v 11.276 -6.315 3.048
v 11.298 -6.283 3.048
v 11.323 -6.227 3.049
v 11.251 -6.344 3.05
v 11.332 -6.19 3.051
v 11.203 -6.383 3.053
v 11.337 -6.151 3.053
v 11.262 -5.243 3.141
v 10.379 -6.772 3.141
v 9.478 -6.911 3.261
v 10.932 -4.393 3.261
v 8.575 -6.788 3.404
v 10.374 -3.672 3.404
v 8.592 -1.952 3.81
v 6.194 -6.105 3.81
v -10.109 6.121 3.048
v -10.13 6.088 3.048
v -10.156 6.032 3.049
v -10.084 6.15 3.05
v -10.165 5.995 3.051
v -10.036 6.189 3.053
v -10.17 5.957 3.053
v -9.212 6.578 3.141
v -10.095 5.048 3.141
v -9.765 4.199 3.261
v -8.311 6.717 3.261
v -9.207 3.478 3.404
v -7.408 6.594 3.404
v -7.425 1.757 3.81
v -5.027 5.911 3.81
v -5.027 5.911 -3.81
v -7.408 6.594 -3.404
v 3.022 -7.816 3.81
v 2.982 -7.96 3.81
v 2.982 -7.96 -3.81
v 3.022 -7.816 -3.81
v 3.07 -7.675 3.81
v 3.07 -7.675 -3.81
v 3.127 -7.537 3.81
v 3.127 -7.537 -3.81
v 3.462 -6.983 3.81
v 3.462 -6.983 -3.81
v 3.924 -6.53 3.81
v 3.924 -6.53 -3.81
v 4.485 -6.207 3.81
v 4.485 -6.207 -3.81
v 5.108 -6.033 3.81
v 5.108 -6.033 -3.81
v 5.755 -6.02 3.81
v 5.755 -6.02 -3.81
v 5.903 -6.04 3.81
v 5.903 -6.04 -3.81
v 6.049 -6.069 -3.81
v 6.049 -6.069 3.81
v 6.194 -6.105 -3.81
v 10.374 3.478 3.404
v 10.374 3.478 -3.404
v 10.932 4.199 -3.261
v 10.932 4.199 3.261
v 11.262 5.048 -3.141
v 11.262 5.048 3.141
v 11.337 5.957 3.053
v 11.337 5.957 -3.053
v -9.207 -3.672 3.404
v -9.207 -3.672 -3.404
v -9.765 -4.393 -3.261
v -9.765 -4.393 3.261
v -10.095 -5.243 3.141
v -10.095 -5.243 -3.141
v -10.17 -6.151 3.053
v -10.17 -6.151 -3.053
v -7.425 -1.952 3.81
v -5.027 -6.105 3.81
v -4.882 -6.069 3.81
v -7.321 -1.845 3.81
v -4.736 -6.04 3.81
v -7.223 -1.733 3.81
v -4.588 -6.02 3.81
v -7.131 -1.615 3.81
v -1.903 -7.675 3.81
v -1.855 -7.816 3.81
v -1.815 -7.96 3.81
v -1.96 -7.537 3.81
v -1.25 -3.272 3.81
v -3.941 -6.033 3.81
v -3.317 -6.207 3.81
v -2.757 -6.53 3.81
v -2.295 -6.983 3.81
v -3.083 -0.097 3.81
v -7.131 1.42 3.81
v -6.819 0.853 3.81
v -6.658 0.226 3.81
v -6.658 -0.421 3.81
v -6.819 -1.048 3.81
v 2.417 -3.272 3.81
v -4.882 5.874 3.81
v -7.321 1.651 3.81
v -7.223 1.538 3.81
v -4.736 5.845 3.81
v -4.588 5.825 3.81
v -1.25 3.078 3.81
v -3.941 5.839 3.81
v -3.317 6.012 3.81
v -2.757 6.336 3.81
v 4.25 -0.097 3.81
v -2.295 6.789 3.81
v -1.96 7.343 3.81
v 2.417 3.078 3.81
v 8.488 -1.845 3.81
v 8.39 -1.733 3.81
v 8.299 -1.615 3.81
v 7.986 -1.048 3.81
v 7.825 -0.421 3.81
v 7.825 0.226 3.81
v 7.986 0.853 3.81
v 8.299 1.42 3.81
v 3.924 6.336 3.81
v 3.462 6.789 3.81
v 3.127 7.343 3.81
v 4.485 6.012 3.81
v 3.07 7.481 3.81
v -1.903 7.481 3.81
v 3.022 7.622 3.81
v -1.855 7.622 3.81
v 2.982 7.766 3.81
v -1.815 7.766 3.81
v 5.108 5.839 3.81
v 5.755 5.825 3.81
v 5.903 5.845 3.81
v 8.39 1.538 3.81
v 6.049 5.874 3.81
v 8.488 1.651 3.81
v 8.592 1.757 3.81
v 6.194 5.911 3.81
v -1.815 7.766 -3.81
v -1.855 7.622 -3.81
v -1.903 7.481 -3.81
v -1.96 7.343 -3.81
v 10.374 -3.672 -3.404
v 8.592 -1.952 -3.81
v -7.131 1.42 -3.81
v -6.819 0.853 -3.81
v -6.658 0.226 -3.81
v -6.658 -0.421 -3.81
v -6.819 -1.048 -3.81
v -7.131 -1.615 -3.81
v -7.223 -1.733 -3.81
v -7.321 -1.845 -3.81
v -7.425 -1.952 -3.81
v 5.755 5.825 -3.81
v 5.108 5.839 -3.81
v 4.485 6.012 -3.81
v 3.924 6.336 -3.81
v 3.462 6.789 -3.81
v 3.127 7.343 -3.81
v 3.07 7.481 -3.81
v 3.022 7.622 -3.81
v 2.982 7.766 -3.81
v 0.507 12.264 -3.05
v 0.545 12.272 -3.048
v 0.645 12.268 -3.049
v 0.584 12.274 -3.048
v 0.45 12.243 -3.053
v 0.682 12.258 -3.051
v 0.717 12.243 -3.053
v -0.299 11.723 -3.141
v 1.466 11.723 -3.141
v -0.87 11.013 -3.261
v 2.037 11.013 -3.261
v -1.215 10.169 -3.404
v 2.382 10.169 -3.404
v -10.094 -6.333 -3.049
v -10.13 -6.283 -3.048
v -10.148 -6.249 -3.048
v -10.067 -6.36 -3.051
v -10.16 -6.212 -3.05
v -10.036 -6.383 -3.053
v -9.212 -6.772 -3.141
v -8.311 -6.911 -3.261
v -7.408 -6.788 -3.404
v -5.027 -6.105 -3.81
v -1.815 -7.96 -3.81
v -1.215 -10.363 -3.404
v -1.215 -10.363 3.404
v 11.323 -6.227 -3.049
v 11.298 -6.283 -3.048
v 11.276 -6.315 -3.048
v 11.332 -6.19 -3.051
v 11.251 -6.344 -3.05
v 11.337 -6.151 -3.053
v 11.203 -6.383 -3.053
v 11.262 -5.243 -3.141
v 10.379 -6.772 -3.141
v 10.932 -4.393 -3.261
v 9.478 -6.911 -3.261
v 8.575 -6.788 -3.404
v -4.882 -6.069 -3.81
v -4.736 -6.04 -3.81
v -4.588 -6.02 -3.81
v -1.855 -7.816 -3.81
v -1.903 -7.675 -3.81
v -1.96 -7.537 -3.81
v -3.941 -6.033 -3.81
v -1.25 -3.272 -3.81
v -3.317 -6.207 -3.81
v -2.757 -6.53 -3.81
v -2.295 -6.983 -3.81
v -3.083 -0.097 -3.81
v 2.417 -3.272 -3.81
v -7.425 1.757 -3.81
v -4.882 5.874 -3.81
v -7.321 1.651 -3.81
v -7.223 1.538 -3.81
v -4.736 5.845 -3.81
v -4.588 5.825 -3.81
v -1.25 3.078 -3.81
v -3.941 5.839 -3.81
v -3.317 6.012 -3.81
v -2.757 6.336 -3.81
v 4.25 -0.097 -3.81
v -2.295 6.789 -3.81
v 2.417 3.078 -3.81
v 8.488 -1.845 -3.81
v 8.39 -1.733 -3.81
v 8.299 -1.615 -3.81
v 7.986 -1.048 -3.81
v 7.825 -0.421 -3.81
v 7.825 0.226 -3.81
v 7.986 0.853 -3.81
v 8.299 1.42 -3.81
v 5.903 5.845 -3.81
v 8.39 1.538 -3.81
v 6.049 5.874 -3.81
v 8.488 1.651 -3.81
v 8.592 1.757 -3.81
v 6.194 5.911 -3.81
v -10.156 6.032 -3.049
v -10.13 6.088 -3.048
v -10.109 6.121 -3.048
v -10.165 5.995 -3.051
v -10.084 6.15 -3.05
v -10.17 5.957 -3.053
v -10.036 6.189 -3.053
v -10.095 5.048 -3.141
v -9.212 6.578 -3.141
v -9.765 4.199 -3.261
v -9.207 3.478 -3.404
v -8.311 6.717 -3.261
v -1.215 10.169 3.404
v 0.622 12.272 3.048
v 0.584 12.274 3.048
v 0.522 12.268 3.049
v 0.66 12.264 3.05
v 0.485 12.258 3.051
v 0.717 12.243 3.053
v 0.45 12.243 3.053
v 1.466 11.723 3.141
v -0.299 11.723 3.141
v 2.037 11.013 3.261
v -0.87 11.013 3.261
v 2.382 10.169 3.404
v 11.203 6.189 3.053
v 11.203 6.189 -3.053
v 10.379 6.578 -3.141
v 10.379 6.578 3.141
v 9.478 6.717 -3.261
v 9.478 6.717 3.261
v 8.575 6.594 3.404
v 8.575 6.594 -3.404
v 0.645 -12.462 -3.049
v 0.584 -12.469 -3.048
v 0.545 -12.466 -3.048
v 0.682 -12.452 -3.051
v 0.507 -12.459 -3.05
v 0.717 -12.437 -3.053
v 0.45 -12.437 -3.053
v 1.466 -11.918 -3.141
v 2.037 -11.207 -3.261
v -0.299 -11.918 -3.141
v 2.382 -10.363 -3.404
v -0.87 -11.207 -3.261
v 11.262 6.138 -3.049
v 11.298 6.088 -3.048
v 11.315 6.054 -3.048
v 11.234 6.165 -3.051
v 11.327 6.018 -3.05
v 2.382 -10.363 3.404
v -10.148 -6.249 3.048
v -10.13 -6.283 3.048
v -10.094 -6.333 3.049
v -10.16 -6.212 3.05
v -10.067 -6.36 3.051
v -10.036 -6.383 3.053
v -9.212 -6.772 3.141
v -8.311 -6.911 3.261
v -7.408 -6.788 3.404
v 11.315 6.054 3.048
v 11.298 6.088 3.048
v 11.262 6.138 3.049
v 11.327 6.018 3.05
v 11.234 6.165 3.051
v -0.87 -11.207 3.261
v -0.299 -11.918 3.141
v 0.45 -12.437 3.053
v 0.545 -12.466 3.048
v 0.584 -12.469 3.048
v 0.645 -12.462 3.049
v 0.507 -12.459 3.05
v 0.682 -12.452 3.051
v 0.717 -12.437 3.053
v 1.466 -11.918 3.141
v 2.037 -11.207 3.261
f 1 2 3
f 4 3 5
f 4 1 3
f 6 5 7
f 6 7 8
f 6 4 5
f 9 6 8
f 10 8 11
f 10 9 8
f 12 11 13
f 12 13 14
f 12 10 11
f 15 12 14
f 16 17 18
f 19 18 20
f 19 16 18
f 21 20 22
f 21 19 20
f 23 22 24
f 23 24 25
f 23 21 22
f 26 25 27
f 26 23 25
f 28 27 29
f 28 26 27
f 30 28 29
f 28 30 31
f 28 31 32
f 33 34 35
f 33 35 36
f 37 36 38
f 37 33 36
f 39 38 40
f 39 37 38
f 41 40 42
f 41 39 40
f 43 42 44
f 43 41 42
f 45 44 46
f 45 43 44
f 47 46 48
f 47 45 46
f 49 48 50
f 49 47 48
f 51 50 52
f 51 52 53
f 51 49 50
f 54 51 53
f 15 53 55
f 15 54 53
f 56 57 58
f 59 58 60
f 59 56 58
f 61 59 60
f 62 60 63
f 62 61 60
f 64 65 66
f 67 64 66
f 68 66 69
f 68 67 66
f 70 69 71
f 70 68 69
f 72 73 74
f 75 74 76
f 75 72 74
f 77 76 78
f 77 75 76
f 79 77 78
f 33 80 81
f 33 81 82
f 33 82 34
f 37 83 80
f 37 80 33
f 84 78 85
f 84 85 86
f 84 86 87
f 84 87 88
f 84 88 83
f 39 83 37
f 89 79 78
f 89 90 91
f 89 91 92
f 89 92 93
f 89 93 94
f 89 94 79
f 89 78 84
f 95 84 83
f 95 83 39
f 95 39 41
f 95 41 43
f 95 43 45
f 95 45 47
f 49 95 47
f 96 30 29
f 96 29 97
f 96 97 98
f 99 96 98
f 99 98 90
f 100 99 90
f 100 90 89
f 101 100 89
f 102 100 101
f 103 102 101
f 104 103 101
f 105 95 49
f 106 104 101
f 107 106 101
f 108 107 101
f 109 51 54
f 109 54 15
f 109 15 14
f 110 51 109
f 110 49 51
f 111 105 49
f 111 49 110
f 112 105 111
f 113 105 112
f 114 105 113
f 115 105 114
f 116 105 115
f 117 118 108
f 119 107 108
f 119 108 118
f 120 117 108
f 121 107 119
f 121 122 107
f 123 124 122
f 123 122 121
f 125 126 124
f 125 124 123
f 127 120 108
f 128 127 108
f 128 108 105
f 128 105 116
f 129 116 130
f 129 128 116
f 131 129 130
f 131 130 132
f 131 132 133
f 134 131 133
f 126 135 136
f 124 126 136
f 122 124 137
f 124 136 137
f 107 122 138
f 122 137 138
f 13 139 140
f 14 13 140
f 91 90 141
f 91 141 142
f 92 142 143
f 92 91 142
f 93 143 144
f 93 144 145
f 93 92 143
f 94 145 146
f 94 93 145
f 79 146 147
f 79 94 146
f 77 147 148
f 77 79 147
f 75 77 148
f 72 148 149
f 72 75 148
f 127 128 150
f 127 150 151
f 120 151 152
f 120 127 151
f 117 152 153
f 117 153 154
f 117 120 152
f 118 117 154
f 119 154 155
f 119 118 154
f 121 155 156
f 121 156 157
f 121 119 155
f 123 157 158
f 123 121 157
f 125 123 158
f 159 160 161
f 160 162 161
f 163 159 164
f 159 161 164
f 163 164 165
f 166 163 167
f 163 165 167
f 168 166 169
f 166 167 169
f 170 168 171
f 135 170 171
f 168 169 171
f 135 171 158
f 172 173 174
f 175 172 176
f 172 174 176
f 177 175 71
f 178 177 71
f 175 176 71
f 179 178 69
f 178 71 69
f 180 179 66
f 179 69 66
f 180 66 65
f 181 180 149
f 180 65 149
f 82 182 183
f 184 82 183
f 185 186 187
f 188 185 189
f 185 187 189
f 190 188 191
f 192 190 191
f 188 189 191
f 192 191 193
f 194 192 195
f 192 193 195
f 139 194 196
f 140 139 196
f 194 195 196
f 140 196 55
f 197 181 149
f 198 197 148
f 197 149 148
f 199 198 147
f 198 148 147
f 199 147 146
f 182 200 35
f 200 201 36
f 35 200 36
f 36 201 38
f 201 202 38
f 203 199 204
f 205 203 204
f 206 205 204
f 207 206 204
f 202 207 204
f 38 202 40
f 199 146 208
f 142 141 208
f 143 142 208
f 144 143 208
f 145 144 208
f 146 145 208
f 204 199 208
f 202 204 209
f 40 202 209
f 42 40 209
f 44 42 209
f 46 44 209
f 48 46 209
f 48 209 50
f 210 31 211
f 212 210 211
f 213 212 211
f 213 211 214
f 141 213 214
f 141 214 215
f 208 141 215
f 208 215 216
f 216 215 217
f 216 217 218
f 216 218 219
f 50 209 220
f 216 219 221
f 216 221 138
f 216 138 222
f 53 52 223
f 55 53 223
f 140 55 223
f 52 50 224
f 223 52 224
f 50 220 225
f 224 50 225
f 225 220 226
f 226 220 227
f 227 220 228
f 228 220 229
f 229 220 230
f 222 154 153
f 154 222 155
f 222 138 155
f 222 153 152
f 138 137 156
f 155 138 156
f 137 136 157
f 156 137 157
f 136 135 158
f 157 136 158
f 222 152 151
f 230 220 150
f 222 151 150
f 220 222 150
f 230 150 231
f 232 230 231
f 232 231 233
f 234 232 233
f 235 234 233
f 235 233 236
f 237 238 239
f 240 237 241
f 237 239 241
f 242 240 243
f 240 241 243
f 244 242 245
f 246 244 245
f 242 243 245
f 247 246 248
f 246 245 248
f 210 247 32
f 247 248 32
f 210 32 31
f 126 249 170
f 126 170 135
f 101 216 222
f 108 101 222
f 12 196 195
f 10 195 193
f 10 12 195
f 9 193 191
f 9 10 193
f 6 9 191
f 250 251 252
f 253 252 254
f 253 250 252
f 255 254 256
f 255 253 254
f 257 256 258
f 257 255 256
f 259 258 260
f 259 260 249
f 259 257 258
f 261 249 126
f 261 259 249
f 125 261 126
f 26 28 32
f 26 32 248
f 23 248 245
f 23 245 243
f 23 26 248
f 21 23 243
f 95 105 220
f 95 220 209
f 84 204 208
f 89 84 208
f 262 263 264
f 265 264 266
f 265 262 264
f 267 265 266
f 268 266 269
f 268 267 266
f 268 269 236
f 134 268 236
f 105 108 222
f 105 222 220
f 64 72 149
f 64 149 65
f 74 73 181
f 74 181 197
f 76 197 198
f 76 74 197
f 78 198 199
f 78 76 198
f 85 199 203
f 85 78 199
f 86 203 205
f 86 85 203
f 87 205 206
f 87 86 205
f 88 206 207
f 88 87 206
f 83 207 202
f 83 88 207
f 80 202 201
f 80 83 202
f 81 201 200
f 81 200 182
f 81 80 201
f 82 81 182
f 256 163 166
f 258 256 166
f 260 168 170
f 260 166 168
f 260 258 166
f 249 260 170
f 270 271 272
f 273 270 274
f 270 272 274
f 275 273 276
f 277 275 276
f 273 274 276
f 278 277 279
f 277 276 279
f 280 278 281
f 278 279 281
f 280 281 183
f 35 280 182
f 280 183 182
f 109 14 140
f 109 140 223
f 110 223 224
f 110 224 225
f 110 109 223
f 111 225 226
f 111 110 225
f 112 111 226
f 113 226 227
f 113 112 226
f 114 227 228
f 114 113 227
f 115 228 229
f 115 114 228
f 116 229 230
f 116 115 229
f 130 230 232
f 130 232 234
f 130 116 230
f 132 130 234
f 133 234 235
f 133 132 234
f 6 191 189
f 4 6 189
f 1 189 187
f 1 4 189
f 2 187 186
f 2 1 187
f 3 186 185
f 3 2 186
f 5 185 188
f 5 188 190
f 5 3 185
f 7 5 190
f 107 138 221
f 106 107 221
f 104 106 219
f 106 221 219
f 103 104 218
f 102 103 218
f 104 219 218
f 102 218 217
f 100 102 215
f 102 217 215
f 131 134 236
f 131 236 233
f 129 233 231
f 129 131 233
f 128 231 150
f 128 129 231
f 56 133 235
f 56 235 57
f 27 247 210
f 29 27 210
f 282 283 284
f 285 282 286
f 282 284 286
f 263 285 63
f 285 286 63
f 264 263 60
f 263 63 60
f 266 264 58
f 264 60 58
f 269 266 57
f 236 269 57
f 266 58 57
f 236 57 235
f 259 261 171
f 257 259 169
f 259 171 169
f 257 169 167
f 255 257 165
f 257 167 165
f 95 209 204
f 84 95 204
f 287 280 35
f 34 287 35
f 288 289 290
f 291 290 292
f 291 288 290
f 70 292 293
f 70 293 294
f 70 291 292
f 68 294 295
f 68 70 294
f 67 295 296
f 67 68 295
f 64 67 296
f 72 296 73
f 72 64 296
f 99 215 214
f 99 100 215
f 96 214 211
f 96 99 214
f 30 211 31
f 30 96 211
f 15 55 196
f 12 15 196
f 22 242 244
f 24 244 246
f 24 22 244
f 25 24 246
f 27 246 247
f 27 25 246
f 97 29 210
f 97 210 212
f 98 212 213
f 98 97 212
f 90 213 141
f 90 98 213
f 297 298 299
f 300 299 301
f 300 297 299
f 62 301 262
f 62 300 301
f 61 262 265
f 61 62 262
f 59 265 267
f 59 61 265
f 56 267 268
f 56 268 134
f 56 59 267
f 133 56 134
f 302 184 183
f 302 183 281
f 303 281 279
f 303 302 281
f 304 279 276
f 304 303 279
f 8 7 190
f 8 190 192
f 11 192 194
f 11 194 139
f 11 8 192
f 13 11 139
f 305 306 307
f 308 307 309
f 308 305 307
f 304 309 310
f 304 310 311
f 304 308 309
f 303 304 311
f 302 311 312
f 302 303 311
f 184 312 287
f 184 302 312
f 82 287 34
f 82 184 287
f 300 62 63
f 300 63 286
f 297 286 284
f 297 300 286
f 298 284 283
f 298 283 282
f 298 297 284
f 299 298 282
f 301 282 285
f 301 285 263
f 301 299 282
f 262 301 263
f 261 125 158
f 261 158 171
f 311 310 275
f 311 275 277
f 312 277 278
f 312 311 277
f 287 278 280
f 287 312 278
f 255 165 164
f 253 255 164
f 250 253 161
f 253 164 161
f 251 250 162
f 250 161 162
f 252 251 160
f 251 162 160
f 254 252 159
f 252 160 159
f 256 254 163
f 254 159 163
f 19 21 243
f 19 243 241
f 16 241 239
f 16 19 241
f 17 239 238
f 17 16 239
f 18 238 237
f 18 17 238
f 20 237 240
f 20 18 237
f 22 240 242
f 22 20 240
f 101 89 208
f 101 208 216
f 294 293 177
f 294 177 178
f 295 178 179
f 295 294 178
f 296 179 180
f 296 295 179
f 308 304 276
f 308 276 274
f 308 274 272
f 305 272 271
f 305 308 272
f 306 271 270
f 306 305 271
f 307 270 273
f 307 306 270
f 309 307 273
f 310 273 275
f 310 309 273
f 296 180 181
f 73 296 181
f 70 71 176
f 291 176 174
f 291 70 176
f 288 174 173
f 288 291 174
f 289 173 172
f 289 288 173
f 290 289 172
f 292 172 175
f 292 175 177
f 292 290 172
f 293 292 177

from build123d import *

# Parameters (mm, degrees)
BOSS_EXTRUDE1_DEPTH     = 3.81
CUT_EXTRUDE1_DEPTH      = 18.281637299
CIRPATTERN1_COUNT       = 6
MIRROR1_COPY_1_DEPTH    = 18.281637299
MIRROR1_COPY_2_DEPTH    = 18.281637299
MIRROR1_COPY_3_DEPTH    = 18.281637299
MIRROR1_COPY_4_DEPTH    = 18.281637299
MIRROR1_COPY_5_DEPTH    = 18.281637299
CUT_EXTRUDE2_DEPTH      = 19.498737463
CUT_EXTRUDE2_DEPTH_BACK = 19.498737463


with BuildPart() as part:
    # Sketch1 → Boss-Extrude1 (new, symmetric)
    with BuildSketch(Plane.XY):
        with BuildLine():
            Line((-5.026722801, 5.910971637), (-7.407741623, 6.593717798))
            ThreePointArc((-7.407741623, 6.593717798), (-8.766513969, 6.679662371), (-10.036356458, 6.18859332))
            ThreePointArc((-10.036356458, 6.18859332), (-10.13048223, 6.088494289), (-10.170107647, 5.956929464))
            ThreePointArc((-10.170107647, 5.956929464), (-9.960464677, 4.611679084), (-9.20664832, 3.477920001))
            Line((-9.20664832, 3.477920001), (-7.424863389, 1.757270295))
            ThreePointArc((-7.424863389, 1.757270295), (-7.270818157, 1.595014723), (-7.131420667, 1.420014312))
            ThreePointArc((-7.131420667, 1.420014312), (-6.637662134, -0.097259644), (-7.131420667, -1.6145336))
            ThreePointArc((-7.131420667, -1.6145336), (-7.270818157, -1.789534012), (-7.424863389, -1.951789584))
            Line((-7.424863389, -1.951789584), (-9.20664832, -3.67243929))
            ThreePointArc((-9.20664832, -3.67243929), (-9.960464677, -4.806198373), (-10.170107647, -6.151448752))
            ThreePointArc((-10.170107647, -6.151448752), (-10.13048223, -6.283013578), (-10.036356458, -6.383112608))
            ThreePointArc((-10.036356458, -6.383112608), (-8.766513969, -6.87418166), (-7.407741623, -6.788237086))
            Line((-7.407741623, -6.788237086), (-5.026722801, -6.105490926))
            ThreePointArc((-5.026722801, -6.105490926), (-4.809182738, -6.053211627), (-4.587929191, -6.019990065))
            ThreePointArc((-4.587929191, -6.019990065), (-3.027052134, -6.351019611), (-1.95993361, -7.537264021))
            ThreePointArc((-1.95993361, -7.537264021), (-1.878077553, -7.745485994), (-1.814582722, -7.960020865))
            Line((-1.814582722, -7.960020865), (-1.215348831, -10.363416732))
            ThreePointArc((-1.215348831, -10.363416732), (-0.610392842, -11.583120388), (0.449806676, -12.437301716))
            ThreePointArc((0.449806676, -12.437301716), (0.583557866, -12.468767511), (0.717309055, -12.437301716))
            ThreePointArc((0.717309055, -12.437301716), (1.777508573, -11.583120388), (2.382464562, -10.363416732))
            Line((2.382464562, -10.363416732), (2.981698454, -7.960020865))
            ThreePointArc((2.981698454, -7.960020865), (3.045193285, -7.745485994), (3.127049342, -7.537264021))
            ThreePointArc((3.127049342, -7.537264021), (4.194167866, -6.351019611), (5.755044922, -6.019990065))
            ThreePointArc((5.755044922, -6.019990065), (5.976298469, -6.053211627), (6.193838533, -6.105490926))
            Line((6.193838533, -6.105490926), (8.574857355, -6.788237086))
            ThreePointArc((8.574857355, -6.788237086), (9.933629701, -6.87418166), (11.203472189, -6.383112608))
            ThreePointArc((11.203472189, -6.383112608), (11.297597962, -6.283013578), (11.337223379, -6.151448752))
            ThreePointArc((11.337223379, -6.151448752), (11.127580408, -4.806198373), (10.373764051, -3.67243929))
            Line((10.373764051, -3.67243929), (8.591979121, -1.951789584))
            ThreePointArc((8.591979121, -1.951789584), (8.437933888, -1.789534012), (8.298536398, -1.6145336))
            ThreePointArc((8.298536398, -1.6145336), (7.804777866, -0.097259644), (8.298536398, 1.420014312))
            ThreePointArc((8.298536398, 1.420014312), (8.437933888, 1.595014723), (8.591979121, 1.757270295))
            Line((8.591979121, 1.757270295), (10.373764051, 3.477920001))
            ThreePointArc((10.373764051, 3.477920001), (11.127580408, 4.611679084), (11.337223379, 5.956929464))
            ThreePointArc((11.337223379, 5.956929464), (11.297597962, 6.088494289), (11.203472189, 6.18859332))
            ThreePointArc((11.203472189, 6.18859332), (9.933629701, 6.679662371), (8.574857355, 6.593717798))
            Line((8.574857355, 6.593717798), (6.193838533, 5.910971637))
            ThreePointArc((6.193838533, 5.910971637), (5.976298469, 5.858692338), (5.755044922, 5.825470777))
            ThreePointArc((5.755044922, 5.825470777), (4.194167866, 6.156500322), (3.127049342, 7.342744732))
            ThreePointArc((3.127049342, 7.342744732), (3.045193285, 7.550966706), (2.981698454, 7.765501576))
            Line((2.981698454, 7.765501576), (2.382464562, 10.168897443))
            ThreePointArc((2.382464562, 10.168897443), (1.777508573, 11.3886011), (0.717309055, 12.242782428))
            ThreePointArc((0.717309055, 12.242782428), (0.583557866, 12.274248223), (0.449806676, 12.242782428))
            ThreePointArc((0.449806676, 12.242782428), (-0.610392842, 11.3886011), (-1.215348831, 10.168897443))
            Line((-1.215348831, 10.168897443), (-1.814582722, 7.765501576))
            ThreePointArc((-1.814582722, 7.765501576), (-1.878077553, 7.550966706), (-1.95993361, 7.342744732))
            ThreePointArc((-1.95993361, 7.342744732), (-3.027052134, 6.156500322), (-4.587929191, 5.825470777))
            ThreePointArc((-4.587929191, 5.825470777), (-4.809182738, 5.858692338), (-5.026722801, 5.910971637))
        make_face()
    extrude(amount=BOSS_EXTRUDE1_DEPTH, both=True)

    # Sketch2 → Cut-Extrude1 (cut, symmetric)
    with BuildSketch(Plane(origin=(0, 0, 0), x_dir=(0, 0, -1), z_dir=(1, 0, 0))):
        Polygon((-3.048, 12.274248223), (-3.81, 7.765501576), (-3.81, 12.274248223), align=None)
    cut_extrude1 = extrude(amount=CUT_EXTRUDE1_DEPTH, both=True, mode=Mode.SUBTRACT)

    # CirPattern1: Cut-Extrude1 ×6 about axis
    cirpattern1_axis = Axis((0.583557866, -0.097259644, -4.191), (0, 0, 1))
    for i in range(1, CIRPATTERN1_COUNT):
        add(cut_extrude1.rotate(cirpattern1_axis, i * 360 / CIRPATTERN1_COUNT), mode=Mode.SUBTRACT)

    # Mirror1: Cut-Extrude1 across plane
    add(cut_extrude1.mirror(Plane.XY), mode=Mode.SUBTRACT)

    # Mirror1 copy 1 sketch → Mirror1 copy 1 (cut, symmetric)
    with BuildSketch(Plane(origin=(0.20754961, -0.554005758, 0), x_dir=(0, 0, 1), z_dir=(0.5000000000000001, 0.8660254037844386, 0))):
        Polygon((-3.048, -12.274248223), (-3.81, -7.765501576), (-3.81, -12.274248223), align=None)
    extrude(amount=MIRROR1_COPY_1_DEPTH, both=True, mode=Mode.SUBTRACT)

    # Mirror1 copy 2 sketch → Mirror1 copy 2 (cut, symmetric)
    with BuildSketch(Plane(origin=(0.791107476, -0.651265403, 0), x_dir=(0, 0, 1), z_dir=(-0.4999999999999998, 0.8660254037844387, 0))):
        Polygon((-3.048, -12.274248223), (-3.81, -7.765501576), (-3.81, -12.274248223), align=None)
    extrude(amount=MIRROR1_COPY_2_DEPTH, both=True, mode=Mode.SUBTRACT)

    # Mirror1 copy 3 sketch → Mirror1 copy 3 (cut, symmetric)
    with BuildSketch(Plane(origin=(1.167115731, -0.194519289, 0), x_dir=(0, 0, 1), z_dir=(-1, 0, 0))):
        Polygon((-3.048, -12.274248223), (-3.81, -7.765501576), (-3.81, -12.274248223), align=None)
    extrude(amount=MIRROR1_COPY_3_DEPTH, both=True, mode=Mode.SUBTRACT)

    # Mirror1 copy 4 sketch → Mirror1 copy 4 (cut, symmetric)
    with BuildSketch(Plane(origin=(0.959566121, 0.35948647, 0), x_dir=(0, 0, 1), z_dir=(-0.5000000000000004, -0.8660254037844384, 0))):
        Polygon((-3.048, -12.274248223), (-3.81, -7.765501576), (-3.81, -12.274248223), align=None)
    extrude(amount=MIRROR1_COPY_4_DEPTH, both=True, mode=Mode.SUBTRACT)

    # Mirror1 copy 5 sketch → Mirror1 copy 5 (cut, symmetric)
    with BuildSketch(Plane(origin=(0.376008256, 0.456746114, 0), x_dir=(0, 0, 1), z_dir=(0.5000000000000001, -0.8660254037844386, 0))):
        Polygon((-3.048, -12.274248223), (-3.81, -7.765501576), (-3.81, -12.274248223), align=None)
    extrude(amount=MIRROR1_COPY_5_DEPTH, both=True, mode=Mode.SUBTRACT)

    # Sketch3 → Cut-Extrude2 (cut, two sides: drawn at the far end of the back side and taken through both)
    with BuildSketch(Plane(origin=(0, 0, -3.81), x_dir=(-1, 0, 0), z_dir=(0, 0, -1)).offset(-CUT_EXTRUDE2_DEPTH_BACK)):
        Polygon((1.249529239, -3.272259644), (3.082616344, -0.097259644), (1.249529239, 3.077740356), (-2.41664497, 3.077740356), (-4.249732075, -0.097259644), (-2.41664497, -3.272259644), align=None)
    extrude(amount=CUT_EXTRUDE2_DEPTH + CUT_EXTRUDE2_DEPTH_BACK, mode=Mode.SUBTRACT)


solid = part.part
